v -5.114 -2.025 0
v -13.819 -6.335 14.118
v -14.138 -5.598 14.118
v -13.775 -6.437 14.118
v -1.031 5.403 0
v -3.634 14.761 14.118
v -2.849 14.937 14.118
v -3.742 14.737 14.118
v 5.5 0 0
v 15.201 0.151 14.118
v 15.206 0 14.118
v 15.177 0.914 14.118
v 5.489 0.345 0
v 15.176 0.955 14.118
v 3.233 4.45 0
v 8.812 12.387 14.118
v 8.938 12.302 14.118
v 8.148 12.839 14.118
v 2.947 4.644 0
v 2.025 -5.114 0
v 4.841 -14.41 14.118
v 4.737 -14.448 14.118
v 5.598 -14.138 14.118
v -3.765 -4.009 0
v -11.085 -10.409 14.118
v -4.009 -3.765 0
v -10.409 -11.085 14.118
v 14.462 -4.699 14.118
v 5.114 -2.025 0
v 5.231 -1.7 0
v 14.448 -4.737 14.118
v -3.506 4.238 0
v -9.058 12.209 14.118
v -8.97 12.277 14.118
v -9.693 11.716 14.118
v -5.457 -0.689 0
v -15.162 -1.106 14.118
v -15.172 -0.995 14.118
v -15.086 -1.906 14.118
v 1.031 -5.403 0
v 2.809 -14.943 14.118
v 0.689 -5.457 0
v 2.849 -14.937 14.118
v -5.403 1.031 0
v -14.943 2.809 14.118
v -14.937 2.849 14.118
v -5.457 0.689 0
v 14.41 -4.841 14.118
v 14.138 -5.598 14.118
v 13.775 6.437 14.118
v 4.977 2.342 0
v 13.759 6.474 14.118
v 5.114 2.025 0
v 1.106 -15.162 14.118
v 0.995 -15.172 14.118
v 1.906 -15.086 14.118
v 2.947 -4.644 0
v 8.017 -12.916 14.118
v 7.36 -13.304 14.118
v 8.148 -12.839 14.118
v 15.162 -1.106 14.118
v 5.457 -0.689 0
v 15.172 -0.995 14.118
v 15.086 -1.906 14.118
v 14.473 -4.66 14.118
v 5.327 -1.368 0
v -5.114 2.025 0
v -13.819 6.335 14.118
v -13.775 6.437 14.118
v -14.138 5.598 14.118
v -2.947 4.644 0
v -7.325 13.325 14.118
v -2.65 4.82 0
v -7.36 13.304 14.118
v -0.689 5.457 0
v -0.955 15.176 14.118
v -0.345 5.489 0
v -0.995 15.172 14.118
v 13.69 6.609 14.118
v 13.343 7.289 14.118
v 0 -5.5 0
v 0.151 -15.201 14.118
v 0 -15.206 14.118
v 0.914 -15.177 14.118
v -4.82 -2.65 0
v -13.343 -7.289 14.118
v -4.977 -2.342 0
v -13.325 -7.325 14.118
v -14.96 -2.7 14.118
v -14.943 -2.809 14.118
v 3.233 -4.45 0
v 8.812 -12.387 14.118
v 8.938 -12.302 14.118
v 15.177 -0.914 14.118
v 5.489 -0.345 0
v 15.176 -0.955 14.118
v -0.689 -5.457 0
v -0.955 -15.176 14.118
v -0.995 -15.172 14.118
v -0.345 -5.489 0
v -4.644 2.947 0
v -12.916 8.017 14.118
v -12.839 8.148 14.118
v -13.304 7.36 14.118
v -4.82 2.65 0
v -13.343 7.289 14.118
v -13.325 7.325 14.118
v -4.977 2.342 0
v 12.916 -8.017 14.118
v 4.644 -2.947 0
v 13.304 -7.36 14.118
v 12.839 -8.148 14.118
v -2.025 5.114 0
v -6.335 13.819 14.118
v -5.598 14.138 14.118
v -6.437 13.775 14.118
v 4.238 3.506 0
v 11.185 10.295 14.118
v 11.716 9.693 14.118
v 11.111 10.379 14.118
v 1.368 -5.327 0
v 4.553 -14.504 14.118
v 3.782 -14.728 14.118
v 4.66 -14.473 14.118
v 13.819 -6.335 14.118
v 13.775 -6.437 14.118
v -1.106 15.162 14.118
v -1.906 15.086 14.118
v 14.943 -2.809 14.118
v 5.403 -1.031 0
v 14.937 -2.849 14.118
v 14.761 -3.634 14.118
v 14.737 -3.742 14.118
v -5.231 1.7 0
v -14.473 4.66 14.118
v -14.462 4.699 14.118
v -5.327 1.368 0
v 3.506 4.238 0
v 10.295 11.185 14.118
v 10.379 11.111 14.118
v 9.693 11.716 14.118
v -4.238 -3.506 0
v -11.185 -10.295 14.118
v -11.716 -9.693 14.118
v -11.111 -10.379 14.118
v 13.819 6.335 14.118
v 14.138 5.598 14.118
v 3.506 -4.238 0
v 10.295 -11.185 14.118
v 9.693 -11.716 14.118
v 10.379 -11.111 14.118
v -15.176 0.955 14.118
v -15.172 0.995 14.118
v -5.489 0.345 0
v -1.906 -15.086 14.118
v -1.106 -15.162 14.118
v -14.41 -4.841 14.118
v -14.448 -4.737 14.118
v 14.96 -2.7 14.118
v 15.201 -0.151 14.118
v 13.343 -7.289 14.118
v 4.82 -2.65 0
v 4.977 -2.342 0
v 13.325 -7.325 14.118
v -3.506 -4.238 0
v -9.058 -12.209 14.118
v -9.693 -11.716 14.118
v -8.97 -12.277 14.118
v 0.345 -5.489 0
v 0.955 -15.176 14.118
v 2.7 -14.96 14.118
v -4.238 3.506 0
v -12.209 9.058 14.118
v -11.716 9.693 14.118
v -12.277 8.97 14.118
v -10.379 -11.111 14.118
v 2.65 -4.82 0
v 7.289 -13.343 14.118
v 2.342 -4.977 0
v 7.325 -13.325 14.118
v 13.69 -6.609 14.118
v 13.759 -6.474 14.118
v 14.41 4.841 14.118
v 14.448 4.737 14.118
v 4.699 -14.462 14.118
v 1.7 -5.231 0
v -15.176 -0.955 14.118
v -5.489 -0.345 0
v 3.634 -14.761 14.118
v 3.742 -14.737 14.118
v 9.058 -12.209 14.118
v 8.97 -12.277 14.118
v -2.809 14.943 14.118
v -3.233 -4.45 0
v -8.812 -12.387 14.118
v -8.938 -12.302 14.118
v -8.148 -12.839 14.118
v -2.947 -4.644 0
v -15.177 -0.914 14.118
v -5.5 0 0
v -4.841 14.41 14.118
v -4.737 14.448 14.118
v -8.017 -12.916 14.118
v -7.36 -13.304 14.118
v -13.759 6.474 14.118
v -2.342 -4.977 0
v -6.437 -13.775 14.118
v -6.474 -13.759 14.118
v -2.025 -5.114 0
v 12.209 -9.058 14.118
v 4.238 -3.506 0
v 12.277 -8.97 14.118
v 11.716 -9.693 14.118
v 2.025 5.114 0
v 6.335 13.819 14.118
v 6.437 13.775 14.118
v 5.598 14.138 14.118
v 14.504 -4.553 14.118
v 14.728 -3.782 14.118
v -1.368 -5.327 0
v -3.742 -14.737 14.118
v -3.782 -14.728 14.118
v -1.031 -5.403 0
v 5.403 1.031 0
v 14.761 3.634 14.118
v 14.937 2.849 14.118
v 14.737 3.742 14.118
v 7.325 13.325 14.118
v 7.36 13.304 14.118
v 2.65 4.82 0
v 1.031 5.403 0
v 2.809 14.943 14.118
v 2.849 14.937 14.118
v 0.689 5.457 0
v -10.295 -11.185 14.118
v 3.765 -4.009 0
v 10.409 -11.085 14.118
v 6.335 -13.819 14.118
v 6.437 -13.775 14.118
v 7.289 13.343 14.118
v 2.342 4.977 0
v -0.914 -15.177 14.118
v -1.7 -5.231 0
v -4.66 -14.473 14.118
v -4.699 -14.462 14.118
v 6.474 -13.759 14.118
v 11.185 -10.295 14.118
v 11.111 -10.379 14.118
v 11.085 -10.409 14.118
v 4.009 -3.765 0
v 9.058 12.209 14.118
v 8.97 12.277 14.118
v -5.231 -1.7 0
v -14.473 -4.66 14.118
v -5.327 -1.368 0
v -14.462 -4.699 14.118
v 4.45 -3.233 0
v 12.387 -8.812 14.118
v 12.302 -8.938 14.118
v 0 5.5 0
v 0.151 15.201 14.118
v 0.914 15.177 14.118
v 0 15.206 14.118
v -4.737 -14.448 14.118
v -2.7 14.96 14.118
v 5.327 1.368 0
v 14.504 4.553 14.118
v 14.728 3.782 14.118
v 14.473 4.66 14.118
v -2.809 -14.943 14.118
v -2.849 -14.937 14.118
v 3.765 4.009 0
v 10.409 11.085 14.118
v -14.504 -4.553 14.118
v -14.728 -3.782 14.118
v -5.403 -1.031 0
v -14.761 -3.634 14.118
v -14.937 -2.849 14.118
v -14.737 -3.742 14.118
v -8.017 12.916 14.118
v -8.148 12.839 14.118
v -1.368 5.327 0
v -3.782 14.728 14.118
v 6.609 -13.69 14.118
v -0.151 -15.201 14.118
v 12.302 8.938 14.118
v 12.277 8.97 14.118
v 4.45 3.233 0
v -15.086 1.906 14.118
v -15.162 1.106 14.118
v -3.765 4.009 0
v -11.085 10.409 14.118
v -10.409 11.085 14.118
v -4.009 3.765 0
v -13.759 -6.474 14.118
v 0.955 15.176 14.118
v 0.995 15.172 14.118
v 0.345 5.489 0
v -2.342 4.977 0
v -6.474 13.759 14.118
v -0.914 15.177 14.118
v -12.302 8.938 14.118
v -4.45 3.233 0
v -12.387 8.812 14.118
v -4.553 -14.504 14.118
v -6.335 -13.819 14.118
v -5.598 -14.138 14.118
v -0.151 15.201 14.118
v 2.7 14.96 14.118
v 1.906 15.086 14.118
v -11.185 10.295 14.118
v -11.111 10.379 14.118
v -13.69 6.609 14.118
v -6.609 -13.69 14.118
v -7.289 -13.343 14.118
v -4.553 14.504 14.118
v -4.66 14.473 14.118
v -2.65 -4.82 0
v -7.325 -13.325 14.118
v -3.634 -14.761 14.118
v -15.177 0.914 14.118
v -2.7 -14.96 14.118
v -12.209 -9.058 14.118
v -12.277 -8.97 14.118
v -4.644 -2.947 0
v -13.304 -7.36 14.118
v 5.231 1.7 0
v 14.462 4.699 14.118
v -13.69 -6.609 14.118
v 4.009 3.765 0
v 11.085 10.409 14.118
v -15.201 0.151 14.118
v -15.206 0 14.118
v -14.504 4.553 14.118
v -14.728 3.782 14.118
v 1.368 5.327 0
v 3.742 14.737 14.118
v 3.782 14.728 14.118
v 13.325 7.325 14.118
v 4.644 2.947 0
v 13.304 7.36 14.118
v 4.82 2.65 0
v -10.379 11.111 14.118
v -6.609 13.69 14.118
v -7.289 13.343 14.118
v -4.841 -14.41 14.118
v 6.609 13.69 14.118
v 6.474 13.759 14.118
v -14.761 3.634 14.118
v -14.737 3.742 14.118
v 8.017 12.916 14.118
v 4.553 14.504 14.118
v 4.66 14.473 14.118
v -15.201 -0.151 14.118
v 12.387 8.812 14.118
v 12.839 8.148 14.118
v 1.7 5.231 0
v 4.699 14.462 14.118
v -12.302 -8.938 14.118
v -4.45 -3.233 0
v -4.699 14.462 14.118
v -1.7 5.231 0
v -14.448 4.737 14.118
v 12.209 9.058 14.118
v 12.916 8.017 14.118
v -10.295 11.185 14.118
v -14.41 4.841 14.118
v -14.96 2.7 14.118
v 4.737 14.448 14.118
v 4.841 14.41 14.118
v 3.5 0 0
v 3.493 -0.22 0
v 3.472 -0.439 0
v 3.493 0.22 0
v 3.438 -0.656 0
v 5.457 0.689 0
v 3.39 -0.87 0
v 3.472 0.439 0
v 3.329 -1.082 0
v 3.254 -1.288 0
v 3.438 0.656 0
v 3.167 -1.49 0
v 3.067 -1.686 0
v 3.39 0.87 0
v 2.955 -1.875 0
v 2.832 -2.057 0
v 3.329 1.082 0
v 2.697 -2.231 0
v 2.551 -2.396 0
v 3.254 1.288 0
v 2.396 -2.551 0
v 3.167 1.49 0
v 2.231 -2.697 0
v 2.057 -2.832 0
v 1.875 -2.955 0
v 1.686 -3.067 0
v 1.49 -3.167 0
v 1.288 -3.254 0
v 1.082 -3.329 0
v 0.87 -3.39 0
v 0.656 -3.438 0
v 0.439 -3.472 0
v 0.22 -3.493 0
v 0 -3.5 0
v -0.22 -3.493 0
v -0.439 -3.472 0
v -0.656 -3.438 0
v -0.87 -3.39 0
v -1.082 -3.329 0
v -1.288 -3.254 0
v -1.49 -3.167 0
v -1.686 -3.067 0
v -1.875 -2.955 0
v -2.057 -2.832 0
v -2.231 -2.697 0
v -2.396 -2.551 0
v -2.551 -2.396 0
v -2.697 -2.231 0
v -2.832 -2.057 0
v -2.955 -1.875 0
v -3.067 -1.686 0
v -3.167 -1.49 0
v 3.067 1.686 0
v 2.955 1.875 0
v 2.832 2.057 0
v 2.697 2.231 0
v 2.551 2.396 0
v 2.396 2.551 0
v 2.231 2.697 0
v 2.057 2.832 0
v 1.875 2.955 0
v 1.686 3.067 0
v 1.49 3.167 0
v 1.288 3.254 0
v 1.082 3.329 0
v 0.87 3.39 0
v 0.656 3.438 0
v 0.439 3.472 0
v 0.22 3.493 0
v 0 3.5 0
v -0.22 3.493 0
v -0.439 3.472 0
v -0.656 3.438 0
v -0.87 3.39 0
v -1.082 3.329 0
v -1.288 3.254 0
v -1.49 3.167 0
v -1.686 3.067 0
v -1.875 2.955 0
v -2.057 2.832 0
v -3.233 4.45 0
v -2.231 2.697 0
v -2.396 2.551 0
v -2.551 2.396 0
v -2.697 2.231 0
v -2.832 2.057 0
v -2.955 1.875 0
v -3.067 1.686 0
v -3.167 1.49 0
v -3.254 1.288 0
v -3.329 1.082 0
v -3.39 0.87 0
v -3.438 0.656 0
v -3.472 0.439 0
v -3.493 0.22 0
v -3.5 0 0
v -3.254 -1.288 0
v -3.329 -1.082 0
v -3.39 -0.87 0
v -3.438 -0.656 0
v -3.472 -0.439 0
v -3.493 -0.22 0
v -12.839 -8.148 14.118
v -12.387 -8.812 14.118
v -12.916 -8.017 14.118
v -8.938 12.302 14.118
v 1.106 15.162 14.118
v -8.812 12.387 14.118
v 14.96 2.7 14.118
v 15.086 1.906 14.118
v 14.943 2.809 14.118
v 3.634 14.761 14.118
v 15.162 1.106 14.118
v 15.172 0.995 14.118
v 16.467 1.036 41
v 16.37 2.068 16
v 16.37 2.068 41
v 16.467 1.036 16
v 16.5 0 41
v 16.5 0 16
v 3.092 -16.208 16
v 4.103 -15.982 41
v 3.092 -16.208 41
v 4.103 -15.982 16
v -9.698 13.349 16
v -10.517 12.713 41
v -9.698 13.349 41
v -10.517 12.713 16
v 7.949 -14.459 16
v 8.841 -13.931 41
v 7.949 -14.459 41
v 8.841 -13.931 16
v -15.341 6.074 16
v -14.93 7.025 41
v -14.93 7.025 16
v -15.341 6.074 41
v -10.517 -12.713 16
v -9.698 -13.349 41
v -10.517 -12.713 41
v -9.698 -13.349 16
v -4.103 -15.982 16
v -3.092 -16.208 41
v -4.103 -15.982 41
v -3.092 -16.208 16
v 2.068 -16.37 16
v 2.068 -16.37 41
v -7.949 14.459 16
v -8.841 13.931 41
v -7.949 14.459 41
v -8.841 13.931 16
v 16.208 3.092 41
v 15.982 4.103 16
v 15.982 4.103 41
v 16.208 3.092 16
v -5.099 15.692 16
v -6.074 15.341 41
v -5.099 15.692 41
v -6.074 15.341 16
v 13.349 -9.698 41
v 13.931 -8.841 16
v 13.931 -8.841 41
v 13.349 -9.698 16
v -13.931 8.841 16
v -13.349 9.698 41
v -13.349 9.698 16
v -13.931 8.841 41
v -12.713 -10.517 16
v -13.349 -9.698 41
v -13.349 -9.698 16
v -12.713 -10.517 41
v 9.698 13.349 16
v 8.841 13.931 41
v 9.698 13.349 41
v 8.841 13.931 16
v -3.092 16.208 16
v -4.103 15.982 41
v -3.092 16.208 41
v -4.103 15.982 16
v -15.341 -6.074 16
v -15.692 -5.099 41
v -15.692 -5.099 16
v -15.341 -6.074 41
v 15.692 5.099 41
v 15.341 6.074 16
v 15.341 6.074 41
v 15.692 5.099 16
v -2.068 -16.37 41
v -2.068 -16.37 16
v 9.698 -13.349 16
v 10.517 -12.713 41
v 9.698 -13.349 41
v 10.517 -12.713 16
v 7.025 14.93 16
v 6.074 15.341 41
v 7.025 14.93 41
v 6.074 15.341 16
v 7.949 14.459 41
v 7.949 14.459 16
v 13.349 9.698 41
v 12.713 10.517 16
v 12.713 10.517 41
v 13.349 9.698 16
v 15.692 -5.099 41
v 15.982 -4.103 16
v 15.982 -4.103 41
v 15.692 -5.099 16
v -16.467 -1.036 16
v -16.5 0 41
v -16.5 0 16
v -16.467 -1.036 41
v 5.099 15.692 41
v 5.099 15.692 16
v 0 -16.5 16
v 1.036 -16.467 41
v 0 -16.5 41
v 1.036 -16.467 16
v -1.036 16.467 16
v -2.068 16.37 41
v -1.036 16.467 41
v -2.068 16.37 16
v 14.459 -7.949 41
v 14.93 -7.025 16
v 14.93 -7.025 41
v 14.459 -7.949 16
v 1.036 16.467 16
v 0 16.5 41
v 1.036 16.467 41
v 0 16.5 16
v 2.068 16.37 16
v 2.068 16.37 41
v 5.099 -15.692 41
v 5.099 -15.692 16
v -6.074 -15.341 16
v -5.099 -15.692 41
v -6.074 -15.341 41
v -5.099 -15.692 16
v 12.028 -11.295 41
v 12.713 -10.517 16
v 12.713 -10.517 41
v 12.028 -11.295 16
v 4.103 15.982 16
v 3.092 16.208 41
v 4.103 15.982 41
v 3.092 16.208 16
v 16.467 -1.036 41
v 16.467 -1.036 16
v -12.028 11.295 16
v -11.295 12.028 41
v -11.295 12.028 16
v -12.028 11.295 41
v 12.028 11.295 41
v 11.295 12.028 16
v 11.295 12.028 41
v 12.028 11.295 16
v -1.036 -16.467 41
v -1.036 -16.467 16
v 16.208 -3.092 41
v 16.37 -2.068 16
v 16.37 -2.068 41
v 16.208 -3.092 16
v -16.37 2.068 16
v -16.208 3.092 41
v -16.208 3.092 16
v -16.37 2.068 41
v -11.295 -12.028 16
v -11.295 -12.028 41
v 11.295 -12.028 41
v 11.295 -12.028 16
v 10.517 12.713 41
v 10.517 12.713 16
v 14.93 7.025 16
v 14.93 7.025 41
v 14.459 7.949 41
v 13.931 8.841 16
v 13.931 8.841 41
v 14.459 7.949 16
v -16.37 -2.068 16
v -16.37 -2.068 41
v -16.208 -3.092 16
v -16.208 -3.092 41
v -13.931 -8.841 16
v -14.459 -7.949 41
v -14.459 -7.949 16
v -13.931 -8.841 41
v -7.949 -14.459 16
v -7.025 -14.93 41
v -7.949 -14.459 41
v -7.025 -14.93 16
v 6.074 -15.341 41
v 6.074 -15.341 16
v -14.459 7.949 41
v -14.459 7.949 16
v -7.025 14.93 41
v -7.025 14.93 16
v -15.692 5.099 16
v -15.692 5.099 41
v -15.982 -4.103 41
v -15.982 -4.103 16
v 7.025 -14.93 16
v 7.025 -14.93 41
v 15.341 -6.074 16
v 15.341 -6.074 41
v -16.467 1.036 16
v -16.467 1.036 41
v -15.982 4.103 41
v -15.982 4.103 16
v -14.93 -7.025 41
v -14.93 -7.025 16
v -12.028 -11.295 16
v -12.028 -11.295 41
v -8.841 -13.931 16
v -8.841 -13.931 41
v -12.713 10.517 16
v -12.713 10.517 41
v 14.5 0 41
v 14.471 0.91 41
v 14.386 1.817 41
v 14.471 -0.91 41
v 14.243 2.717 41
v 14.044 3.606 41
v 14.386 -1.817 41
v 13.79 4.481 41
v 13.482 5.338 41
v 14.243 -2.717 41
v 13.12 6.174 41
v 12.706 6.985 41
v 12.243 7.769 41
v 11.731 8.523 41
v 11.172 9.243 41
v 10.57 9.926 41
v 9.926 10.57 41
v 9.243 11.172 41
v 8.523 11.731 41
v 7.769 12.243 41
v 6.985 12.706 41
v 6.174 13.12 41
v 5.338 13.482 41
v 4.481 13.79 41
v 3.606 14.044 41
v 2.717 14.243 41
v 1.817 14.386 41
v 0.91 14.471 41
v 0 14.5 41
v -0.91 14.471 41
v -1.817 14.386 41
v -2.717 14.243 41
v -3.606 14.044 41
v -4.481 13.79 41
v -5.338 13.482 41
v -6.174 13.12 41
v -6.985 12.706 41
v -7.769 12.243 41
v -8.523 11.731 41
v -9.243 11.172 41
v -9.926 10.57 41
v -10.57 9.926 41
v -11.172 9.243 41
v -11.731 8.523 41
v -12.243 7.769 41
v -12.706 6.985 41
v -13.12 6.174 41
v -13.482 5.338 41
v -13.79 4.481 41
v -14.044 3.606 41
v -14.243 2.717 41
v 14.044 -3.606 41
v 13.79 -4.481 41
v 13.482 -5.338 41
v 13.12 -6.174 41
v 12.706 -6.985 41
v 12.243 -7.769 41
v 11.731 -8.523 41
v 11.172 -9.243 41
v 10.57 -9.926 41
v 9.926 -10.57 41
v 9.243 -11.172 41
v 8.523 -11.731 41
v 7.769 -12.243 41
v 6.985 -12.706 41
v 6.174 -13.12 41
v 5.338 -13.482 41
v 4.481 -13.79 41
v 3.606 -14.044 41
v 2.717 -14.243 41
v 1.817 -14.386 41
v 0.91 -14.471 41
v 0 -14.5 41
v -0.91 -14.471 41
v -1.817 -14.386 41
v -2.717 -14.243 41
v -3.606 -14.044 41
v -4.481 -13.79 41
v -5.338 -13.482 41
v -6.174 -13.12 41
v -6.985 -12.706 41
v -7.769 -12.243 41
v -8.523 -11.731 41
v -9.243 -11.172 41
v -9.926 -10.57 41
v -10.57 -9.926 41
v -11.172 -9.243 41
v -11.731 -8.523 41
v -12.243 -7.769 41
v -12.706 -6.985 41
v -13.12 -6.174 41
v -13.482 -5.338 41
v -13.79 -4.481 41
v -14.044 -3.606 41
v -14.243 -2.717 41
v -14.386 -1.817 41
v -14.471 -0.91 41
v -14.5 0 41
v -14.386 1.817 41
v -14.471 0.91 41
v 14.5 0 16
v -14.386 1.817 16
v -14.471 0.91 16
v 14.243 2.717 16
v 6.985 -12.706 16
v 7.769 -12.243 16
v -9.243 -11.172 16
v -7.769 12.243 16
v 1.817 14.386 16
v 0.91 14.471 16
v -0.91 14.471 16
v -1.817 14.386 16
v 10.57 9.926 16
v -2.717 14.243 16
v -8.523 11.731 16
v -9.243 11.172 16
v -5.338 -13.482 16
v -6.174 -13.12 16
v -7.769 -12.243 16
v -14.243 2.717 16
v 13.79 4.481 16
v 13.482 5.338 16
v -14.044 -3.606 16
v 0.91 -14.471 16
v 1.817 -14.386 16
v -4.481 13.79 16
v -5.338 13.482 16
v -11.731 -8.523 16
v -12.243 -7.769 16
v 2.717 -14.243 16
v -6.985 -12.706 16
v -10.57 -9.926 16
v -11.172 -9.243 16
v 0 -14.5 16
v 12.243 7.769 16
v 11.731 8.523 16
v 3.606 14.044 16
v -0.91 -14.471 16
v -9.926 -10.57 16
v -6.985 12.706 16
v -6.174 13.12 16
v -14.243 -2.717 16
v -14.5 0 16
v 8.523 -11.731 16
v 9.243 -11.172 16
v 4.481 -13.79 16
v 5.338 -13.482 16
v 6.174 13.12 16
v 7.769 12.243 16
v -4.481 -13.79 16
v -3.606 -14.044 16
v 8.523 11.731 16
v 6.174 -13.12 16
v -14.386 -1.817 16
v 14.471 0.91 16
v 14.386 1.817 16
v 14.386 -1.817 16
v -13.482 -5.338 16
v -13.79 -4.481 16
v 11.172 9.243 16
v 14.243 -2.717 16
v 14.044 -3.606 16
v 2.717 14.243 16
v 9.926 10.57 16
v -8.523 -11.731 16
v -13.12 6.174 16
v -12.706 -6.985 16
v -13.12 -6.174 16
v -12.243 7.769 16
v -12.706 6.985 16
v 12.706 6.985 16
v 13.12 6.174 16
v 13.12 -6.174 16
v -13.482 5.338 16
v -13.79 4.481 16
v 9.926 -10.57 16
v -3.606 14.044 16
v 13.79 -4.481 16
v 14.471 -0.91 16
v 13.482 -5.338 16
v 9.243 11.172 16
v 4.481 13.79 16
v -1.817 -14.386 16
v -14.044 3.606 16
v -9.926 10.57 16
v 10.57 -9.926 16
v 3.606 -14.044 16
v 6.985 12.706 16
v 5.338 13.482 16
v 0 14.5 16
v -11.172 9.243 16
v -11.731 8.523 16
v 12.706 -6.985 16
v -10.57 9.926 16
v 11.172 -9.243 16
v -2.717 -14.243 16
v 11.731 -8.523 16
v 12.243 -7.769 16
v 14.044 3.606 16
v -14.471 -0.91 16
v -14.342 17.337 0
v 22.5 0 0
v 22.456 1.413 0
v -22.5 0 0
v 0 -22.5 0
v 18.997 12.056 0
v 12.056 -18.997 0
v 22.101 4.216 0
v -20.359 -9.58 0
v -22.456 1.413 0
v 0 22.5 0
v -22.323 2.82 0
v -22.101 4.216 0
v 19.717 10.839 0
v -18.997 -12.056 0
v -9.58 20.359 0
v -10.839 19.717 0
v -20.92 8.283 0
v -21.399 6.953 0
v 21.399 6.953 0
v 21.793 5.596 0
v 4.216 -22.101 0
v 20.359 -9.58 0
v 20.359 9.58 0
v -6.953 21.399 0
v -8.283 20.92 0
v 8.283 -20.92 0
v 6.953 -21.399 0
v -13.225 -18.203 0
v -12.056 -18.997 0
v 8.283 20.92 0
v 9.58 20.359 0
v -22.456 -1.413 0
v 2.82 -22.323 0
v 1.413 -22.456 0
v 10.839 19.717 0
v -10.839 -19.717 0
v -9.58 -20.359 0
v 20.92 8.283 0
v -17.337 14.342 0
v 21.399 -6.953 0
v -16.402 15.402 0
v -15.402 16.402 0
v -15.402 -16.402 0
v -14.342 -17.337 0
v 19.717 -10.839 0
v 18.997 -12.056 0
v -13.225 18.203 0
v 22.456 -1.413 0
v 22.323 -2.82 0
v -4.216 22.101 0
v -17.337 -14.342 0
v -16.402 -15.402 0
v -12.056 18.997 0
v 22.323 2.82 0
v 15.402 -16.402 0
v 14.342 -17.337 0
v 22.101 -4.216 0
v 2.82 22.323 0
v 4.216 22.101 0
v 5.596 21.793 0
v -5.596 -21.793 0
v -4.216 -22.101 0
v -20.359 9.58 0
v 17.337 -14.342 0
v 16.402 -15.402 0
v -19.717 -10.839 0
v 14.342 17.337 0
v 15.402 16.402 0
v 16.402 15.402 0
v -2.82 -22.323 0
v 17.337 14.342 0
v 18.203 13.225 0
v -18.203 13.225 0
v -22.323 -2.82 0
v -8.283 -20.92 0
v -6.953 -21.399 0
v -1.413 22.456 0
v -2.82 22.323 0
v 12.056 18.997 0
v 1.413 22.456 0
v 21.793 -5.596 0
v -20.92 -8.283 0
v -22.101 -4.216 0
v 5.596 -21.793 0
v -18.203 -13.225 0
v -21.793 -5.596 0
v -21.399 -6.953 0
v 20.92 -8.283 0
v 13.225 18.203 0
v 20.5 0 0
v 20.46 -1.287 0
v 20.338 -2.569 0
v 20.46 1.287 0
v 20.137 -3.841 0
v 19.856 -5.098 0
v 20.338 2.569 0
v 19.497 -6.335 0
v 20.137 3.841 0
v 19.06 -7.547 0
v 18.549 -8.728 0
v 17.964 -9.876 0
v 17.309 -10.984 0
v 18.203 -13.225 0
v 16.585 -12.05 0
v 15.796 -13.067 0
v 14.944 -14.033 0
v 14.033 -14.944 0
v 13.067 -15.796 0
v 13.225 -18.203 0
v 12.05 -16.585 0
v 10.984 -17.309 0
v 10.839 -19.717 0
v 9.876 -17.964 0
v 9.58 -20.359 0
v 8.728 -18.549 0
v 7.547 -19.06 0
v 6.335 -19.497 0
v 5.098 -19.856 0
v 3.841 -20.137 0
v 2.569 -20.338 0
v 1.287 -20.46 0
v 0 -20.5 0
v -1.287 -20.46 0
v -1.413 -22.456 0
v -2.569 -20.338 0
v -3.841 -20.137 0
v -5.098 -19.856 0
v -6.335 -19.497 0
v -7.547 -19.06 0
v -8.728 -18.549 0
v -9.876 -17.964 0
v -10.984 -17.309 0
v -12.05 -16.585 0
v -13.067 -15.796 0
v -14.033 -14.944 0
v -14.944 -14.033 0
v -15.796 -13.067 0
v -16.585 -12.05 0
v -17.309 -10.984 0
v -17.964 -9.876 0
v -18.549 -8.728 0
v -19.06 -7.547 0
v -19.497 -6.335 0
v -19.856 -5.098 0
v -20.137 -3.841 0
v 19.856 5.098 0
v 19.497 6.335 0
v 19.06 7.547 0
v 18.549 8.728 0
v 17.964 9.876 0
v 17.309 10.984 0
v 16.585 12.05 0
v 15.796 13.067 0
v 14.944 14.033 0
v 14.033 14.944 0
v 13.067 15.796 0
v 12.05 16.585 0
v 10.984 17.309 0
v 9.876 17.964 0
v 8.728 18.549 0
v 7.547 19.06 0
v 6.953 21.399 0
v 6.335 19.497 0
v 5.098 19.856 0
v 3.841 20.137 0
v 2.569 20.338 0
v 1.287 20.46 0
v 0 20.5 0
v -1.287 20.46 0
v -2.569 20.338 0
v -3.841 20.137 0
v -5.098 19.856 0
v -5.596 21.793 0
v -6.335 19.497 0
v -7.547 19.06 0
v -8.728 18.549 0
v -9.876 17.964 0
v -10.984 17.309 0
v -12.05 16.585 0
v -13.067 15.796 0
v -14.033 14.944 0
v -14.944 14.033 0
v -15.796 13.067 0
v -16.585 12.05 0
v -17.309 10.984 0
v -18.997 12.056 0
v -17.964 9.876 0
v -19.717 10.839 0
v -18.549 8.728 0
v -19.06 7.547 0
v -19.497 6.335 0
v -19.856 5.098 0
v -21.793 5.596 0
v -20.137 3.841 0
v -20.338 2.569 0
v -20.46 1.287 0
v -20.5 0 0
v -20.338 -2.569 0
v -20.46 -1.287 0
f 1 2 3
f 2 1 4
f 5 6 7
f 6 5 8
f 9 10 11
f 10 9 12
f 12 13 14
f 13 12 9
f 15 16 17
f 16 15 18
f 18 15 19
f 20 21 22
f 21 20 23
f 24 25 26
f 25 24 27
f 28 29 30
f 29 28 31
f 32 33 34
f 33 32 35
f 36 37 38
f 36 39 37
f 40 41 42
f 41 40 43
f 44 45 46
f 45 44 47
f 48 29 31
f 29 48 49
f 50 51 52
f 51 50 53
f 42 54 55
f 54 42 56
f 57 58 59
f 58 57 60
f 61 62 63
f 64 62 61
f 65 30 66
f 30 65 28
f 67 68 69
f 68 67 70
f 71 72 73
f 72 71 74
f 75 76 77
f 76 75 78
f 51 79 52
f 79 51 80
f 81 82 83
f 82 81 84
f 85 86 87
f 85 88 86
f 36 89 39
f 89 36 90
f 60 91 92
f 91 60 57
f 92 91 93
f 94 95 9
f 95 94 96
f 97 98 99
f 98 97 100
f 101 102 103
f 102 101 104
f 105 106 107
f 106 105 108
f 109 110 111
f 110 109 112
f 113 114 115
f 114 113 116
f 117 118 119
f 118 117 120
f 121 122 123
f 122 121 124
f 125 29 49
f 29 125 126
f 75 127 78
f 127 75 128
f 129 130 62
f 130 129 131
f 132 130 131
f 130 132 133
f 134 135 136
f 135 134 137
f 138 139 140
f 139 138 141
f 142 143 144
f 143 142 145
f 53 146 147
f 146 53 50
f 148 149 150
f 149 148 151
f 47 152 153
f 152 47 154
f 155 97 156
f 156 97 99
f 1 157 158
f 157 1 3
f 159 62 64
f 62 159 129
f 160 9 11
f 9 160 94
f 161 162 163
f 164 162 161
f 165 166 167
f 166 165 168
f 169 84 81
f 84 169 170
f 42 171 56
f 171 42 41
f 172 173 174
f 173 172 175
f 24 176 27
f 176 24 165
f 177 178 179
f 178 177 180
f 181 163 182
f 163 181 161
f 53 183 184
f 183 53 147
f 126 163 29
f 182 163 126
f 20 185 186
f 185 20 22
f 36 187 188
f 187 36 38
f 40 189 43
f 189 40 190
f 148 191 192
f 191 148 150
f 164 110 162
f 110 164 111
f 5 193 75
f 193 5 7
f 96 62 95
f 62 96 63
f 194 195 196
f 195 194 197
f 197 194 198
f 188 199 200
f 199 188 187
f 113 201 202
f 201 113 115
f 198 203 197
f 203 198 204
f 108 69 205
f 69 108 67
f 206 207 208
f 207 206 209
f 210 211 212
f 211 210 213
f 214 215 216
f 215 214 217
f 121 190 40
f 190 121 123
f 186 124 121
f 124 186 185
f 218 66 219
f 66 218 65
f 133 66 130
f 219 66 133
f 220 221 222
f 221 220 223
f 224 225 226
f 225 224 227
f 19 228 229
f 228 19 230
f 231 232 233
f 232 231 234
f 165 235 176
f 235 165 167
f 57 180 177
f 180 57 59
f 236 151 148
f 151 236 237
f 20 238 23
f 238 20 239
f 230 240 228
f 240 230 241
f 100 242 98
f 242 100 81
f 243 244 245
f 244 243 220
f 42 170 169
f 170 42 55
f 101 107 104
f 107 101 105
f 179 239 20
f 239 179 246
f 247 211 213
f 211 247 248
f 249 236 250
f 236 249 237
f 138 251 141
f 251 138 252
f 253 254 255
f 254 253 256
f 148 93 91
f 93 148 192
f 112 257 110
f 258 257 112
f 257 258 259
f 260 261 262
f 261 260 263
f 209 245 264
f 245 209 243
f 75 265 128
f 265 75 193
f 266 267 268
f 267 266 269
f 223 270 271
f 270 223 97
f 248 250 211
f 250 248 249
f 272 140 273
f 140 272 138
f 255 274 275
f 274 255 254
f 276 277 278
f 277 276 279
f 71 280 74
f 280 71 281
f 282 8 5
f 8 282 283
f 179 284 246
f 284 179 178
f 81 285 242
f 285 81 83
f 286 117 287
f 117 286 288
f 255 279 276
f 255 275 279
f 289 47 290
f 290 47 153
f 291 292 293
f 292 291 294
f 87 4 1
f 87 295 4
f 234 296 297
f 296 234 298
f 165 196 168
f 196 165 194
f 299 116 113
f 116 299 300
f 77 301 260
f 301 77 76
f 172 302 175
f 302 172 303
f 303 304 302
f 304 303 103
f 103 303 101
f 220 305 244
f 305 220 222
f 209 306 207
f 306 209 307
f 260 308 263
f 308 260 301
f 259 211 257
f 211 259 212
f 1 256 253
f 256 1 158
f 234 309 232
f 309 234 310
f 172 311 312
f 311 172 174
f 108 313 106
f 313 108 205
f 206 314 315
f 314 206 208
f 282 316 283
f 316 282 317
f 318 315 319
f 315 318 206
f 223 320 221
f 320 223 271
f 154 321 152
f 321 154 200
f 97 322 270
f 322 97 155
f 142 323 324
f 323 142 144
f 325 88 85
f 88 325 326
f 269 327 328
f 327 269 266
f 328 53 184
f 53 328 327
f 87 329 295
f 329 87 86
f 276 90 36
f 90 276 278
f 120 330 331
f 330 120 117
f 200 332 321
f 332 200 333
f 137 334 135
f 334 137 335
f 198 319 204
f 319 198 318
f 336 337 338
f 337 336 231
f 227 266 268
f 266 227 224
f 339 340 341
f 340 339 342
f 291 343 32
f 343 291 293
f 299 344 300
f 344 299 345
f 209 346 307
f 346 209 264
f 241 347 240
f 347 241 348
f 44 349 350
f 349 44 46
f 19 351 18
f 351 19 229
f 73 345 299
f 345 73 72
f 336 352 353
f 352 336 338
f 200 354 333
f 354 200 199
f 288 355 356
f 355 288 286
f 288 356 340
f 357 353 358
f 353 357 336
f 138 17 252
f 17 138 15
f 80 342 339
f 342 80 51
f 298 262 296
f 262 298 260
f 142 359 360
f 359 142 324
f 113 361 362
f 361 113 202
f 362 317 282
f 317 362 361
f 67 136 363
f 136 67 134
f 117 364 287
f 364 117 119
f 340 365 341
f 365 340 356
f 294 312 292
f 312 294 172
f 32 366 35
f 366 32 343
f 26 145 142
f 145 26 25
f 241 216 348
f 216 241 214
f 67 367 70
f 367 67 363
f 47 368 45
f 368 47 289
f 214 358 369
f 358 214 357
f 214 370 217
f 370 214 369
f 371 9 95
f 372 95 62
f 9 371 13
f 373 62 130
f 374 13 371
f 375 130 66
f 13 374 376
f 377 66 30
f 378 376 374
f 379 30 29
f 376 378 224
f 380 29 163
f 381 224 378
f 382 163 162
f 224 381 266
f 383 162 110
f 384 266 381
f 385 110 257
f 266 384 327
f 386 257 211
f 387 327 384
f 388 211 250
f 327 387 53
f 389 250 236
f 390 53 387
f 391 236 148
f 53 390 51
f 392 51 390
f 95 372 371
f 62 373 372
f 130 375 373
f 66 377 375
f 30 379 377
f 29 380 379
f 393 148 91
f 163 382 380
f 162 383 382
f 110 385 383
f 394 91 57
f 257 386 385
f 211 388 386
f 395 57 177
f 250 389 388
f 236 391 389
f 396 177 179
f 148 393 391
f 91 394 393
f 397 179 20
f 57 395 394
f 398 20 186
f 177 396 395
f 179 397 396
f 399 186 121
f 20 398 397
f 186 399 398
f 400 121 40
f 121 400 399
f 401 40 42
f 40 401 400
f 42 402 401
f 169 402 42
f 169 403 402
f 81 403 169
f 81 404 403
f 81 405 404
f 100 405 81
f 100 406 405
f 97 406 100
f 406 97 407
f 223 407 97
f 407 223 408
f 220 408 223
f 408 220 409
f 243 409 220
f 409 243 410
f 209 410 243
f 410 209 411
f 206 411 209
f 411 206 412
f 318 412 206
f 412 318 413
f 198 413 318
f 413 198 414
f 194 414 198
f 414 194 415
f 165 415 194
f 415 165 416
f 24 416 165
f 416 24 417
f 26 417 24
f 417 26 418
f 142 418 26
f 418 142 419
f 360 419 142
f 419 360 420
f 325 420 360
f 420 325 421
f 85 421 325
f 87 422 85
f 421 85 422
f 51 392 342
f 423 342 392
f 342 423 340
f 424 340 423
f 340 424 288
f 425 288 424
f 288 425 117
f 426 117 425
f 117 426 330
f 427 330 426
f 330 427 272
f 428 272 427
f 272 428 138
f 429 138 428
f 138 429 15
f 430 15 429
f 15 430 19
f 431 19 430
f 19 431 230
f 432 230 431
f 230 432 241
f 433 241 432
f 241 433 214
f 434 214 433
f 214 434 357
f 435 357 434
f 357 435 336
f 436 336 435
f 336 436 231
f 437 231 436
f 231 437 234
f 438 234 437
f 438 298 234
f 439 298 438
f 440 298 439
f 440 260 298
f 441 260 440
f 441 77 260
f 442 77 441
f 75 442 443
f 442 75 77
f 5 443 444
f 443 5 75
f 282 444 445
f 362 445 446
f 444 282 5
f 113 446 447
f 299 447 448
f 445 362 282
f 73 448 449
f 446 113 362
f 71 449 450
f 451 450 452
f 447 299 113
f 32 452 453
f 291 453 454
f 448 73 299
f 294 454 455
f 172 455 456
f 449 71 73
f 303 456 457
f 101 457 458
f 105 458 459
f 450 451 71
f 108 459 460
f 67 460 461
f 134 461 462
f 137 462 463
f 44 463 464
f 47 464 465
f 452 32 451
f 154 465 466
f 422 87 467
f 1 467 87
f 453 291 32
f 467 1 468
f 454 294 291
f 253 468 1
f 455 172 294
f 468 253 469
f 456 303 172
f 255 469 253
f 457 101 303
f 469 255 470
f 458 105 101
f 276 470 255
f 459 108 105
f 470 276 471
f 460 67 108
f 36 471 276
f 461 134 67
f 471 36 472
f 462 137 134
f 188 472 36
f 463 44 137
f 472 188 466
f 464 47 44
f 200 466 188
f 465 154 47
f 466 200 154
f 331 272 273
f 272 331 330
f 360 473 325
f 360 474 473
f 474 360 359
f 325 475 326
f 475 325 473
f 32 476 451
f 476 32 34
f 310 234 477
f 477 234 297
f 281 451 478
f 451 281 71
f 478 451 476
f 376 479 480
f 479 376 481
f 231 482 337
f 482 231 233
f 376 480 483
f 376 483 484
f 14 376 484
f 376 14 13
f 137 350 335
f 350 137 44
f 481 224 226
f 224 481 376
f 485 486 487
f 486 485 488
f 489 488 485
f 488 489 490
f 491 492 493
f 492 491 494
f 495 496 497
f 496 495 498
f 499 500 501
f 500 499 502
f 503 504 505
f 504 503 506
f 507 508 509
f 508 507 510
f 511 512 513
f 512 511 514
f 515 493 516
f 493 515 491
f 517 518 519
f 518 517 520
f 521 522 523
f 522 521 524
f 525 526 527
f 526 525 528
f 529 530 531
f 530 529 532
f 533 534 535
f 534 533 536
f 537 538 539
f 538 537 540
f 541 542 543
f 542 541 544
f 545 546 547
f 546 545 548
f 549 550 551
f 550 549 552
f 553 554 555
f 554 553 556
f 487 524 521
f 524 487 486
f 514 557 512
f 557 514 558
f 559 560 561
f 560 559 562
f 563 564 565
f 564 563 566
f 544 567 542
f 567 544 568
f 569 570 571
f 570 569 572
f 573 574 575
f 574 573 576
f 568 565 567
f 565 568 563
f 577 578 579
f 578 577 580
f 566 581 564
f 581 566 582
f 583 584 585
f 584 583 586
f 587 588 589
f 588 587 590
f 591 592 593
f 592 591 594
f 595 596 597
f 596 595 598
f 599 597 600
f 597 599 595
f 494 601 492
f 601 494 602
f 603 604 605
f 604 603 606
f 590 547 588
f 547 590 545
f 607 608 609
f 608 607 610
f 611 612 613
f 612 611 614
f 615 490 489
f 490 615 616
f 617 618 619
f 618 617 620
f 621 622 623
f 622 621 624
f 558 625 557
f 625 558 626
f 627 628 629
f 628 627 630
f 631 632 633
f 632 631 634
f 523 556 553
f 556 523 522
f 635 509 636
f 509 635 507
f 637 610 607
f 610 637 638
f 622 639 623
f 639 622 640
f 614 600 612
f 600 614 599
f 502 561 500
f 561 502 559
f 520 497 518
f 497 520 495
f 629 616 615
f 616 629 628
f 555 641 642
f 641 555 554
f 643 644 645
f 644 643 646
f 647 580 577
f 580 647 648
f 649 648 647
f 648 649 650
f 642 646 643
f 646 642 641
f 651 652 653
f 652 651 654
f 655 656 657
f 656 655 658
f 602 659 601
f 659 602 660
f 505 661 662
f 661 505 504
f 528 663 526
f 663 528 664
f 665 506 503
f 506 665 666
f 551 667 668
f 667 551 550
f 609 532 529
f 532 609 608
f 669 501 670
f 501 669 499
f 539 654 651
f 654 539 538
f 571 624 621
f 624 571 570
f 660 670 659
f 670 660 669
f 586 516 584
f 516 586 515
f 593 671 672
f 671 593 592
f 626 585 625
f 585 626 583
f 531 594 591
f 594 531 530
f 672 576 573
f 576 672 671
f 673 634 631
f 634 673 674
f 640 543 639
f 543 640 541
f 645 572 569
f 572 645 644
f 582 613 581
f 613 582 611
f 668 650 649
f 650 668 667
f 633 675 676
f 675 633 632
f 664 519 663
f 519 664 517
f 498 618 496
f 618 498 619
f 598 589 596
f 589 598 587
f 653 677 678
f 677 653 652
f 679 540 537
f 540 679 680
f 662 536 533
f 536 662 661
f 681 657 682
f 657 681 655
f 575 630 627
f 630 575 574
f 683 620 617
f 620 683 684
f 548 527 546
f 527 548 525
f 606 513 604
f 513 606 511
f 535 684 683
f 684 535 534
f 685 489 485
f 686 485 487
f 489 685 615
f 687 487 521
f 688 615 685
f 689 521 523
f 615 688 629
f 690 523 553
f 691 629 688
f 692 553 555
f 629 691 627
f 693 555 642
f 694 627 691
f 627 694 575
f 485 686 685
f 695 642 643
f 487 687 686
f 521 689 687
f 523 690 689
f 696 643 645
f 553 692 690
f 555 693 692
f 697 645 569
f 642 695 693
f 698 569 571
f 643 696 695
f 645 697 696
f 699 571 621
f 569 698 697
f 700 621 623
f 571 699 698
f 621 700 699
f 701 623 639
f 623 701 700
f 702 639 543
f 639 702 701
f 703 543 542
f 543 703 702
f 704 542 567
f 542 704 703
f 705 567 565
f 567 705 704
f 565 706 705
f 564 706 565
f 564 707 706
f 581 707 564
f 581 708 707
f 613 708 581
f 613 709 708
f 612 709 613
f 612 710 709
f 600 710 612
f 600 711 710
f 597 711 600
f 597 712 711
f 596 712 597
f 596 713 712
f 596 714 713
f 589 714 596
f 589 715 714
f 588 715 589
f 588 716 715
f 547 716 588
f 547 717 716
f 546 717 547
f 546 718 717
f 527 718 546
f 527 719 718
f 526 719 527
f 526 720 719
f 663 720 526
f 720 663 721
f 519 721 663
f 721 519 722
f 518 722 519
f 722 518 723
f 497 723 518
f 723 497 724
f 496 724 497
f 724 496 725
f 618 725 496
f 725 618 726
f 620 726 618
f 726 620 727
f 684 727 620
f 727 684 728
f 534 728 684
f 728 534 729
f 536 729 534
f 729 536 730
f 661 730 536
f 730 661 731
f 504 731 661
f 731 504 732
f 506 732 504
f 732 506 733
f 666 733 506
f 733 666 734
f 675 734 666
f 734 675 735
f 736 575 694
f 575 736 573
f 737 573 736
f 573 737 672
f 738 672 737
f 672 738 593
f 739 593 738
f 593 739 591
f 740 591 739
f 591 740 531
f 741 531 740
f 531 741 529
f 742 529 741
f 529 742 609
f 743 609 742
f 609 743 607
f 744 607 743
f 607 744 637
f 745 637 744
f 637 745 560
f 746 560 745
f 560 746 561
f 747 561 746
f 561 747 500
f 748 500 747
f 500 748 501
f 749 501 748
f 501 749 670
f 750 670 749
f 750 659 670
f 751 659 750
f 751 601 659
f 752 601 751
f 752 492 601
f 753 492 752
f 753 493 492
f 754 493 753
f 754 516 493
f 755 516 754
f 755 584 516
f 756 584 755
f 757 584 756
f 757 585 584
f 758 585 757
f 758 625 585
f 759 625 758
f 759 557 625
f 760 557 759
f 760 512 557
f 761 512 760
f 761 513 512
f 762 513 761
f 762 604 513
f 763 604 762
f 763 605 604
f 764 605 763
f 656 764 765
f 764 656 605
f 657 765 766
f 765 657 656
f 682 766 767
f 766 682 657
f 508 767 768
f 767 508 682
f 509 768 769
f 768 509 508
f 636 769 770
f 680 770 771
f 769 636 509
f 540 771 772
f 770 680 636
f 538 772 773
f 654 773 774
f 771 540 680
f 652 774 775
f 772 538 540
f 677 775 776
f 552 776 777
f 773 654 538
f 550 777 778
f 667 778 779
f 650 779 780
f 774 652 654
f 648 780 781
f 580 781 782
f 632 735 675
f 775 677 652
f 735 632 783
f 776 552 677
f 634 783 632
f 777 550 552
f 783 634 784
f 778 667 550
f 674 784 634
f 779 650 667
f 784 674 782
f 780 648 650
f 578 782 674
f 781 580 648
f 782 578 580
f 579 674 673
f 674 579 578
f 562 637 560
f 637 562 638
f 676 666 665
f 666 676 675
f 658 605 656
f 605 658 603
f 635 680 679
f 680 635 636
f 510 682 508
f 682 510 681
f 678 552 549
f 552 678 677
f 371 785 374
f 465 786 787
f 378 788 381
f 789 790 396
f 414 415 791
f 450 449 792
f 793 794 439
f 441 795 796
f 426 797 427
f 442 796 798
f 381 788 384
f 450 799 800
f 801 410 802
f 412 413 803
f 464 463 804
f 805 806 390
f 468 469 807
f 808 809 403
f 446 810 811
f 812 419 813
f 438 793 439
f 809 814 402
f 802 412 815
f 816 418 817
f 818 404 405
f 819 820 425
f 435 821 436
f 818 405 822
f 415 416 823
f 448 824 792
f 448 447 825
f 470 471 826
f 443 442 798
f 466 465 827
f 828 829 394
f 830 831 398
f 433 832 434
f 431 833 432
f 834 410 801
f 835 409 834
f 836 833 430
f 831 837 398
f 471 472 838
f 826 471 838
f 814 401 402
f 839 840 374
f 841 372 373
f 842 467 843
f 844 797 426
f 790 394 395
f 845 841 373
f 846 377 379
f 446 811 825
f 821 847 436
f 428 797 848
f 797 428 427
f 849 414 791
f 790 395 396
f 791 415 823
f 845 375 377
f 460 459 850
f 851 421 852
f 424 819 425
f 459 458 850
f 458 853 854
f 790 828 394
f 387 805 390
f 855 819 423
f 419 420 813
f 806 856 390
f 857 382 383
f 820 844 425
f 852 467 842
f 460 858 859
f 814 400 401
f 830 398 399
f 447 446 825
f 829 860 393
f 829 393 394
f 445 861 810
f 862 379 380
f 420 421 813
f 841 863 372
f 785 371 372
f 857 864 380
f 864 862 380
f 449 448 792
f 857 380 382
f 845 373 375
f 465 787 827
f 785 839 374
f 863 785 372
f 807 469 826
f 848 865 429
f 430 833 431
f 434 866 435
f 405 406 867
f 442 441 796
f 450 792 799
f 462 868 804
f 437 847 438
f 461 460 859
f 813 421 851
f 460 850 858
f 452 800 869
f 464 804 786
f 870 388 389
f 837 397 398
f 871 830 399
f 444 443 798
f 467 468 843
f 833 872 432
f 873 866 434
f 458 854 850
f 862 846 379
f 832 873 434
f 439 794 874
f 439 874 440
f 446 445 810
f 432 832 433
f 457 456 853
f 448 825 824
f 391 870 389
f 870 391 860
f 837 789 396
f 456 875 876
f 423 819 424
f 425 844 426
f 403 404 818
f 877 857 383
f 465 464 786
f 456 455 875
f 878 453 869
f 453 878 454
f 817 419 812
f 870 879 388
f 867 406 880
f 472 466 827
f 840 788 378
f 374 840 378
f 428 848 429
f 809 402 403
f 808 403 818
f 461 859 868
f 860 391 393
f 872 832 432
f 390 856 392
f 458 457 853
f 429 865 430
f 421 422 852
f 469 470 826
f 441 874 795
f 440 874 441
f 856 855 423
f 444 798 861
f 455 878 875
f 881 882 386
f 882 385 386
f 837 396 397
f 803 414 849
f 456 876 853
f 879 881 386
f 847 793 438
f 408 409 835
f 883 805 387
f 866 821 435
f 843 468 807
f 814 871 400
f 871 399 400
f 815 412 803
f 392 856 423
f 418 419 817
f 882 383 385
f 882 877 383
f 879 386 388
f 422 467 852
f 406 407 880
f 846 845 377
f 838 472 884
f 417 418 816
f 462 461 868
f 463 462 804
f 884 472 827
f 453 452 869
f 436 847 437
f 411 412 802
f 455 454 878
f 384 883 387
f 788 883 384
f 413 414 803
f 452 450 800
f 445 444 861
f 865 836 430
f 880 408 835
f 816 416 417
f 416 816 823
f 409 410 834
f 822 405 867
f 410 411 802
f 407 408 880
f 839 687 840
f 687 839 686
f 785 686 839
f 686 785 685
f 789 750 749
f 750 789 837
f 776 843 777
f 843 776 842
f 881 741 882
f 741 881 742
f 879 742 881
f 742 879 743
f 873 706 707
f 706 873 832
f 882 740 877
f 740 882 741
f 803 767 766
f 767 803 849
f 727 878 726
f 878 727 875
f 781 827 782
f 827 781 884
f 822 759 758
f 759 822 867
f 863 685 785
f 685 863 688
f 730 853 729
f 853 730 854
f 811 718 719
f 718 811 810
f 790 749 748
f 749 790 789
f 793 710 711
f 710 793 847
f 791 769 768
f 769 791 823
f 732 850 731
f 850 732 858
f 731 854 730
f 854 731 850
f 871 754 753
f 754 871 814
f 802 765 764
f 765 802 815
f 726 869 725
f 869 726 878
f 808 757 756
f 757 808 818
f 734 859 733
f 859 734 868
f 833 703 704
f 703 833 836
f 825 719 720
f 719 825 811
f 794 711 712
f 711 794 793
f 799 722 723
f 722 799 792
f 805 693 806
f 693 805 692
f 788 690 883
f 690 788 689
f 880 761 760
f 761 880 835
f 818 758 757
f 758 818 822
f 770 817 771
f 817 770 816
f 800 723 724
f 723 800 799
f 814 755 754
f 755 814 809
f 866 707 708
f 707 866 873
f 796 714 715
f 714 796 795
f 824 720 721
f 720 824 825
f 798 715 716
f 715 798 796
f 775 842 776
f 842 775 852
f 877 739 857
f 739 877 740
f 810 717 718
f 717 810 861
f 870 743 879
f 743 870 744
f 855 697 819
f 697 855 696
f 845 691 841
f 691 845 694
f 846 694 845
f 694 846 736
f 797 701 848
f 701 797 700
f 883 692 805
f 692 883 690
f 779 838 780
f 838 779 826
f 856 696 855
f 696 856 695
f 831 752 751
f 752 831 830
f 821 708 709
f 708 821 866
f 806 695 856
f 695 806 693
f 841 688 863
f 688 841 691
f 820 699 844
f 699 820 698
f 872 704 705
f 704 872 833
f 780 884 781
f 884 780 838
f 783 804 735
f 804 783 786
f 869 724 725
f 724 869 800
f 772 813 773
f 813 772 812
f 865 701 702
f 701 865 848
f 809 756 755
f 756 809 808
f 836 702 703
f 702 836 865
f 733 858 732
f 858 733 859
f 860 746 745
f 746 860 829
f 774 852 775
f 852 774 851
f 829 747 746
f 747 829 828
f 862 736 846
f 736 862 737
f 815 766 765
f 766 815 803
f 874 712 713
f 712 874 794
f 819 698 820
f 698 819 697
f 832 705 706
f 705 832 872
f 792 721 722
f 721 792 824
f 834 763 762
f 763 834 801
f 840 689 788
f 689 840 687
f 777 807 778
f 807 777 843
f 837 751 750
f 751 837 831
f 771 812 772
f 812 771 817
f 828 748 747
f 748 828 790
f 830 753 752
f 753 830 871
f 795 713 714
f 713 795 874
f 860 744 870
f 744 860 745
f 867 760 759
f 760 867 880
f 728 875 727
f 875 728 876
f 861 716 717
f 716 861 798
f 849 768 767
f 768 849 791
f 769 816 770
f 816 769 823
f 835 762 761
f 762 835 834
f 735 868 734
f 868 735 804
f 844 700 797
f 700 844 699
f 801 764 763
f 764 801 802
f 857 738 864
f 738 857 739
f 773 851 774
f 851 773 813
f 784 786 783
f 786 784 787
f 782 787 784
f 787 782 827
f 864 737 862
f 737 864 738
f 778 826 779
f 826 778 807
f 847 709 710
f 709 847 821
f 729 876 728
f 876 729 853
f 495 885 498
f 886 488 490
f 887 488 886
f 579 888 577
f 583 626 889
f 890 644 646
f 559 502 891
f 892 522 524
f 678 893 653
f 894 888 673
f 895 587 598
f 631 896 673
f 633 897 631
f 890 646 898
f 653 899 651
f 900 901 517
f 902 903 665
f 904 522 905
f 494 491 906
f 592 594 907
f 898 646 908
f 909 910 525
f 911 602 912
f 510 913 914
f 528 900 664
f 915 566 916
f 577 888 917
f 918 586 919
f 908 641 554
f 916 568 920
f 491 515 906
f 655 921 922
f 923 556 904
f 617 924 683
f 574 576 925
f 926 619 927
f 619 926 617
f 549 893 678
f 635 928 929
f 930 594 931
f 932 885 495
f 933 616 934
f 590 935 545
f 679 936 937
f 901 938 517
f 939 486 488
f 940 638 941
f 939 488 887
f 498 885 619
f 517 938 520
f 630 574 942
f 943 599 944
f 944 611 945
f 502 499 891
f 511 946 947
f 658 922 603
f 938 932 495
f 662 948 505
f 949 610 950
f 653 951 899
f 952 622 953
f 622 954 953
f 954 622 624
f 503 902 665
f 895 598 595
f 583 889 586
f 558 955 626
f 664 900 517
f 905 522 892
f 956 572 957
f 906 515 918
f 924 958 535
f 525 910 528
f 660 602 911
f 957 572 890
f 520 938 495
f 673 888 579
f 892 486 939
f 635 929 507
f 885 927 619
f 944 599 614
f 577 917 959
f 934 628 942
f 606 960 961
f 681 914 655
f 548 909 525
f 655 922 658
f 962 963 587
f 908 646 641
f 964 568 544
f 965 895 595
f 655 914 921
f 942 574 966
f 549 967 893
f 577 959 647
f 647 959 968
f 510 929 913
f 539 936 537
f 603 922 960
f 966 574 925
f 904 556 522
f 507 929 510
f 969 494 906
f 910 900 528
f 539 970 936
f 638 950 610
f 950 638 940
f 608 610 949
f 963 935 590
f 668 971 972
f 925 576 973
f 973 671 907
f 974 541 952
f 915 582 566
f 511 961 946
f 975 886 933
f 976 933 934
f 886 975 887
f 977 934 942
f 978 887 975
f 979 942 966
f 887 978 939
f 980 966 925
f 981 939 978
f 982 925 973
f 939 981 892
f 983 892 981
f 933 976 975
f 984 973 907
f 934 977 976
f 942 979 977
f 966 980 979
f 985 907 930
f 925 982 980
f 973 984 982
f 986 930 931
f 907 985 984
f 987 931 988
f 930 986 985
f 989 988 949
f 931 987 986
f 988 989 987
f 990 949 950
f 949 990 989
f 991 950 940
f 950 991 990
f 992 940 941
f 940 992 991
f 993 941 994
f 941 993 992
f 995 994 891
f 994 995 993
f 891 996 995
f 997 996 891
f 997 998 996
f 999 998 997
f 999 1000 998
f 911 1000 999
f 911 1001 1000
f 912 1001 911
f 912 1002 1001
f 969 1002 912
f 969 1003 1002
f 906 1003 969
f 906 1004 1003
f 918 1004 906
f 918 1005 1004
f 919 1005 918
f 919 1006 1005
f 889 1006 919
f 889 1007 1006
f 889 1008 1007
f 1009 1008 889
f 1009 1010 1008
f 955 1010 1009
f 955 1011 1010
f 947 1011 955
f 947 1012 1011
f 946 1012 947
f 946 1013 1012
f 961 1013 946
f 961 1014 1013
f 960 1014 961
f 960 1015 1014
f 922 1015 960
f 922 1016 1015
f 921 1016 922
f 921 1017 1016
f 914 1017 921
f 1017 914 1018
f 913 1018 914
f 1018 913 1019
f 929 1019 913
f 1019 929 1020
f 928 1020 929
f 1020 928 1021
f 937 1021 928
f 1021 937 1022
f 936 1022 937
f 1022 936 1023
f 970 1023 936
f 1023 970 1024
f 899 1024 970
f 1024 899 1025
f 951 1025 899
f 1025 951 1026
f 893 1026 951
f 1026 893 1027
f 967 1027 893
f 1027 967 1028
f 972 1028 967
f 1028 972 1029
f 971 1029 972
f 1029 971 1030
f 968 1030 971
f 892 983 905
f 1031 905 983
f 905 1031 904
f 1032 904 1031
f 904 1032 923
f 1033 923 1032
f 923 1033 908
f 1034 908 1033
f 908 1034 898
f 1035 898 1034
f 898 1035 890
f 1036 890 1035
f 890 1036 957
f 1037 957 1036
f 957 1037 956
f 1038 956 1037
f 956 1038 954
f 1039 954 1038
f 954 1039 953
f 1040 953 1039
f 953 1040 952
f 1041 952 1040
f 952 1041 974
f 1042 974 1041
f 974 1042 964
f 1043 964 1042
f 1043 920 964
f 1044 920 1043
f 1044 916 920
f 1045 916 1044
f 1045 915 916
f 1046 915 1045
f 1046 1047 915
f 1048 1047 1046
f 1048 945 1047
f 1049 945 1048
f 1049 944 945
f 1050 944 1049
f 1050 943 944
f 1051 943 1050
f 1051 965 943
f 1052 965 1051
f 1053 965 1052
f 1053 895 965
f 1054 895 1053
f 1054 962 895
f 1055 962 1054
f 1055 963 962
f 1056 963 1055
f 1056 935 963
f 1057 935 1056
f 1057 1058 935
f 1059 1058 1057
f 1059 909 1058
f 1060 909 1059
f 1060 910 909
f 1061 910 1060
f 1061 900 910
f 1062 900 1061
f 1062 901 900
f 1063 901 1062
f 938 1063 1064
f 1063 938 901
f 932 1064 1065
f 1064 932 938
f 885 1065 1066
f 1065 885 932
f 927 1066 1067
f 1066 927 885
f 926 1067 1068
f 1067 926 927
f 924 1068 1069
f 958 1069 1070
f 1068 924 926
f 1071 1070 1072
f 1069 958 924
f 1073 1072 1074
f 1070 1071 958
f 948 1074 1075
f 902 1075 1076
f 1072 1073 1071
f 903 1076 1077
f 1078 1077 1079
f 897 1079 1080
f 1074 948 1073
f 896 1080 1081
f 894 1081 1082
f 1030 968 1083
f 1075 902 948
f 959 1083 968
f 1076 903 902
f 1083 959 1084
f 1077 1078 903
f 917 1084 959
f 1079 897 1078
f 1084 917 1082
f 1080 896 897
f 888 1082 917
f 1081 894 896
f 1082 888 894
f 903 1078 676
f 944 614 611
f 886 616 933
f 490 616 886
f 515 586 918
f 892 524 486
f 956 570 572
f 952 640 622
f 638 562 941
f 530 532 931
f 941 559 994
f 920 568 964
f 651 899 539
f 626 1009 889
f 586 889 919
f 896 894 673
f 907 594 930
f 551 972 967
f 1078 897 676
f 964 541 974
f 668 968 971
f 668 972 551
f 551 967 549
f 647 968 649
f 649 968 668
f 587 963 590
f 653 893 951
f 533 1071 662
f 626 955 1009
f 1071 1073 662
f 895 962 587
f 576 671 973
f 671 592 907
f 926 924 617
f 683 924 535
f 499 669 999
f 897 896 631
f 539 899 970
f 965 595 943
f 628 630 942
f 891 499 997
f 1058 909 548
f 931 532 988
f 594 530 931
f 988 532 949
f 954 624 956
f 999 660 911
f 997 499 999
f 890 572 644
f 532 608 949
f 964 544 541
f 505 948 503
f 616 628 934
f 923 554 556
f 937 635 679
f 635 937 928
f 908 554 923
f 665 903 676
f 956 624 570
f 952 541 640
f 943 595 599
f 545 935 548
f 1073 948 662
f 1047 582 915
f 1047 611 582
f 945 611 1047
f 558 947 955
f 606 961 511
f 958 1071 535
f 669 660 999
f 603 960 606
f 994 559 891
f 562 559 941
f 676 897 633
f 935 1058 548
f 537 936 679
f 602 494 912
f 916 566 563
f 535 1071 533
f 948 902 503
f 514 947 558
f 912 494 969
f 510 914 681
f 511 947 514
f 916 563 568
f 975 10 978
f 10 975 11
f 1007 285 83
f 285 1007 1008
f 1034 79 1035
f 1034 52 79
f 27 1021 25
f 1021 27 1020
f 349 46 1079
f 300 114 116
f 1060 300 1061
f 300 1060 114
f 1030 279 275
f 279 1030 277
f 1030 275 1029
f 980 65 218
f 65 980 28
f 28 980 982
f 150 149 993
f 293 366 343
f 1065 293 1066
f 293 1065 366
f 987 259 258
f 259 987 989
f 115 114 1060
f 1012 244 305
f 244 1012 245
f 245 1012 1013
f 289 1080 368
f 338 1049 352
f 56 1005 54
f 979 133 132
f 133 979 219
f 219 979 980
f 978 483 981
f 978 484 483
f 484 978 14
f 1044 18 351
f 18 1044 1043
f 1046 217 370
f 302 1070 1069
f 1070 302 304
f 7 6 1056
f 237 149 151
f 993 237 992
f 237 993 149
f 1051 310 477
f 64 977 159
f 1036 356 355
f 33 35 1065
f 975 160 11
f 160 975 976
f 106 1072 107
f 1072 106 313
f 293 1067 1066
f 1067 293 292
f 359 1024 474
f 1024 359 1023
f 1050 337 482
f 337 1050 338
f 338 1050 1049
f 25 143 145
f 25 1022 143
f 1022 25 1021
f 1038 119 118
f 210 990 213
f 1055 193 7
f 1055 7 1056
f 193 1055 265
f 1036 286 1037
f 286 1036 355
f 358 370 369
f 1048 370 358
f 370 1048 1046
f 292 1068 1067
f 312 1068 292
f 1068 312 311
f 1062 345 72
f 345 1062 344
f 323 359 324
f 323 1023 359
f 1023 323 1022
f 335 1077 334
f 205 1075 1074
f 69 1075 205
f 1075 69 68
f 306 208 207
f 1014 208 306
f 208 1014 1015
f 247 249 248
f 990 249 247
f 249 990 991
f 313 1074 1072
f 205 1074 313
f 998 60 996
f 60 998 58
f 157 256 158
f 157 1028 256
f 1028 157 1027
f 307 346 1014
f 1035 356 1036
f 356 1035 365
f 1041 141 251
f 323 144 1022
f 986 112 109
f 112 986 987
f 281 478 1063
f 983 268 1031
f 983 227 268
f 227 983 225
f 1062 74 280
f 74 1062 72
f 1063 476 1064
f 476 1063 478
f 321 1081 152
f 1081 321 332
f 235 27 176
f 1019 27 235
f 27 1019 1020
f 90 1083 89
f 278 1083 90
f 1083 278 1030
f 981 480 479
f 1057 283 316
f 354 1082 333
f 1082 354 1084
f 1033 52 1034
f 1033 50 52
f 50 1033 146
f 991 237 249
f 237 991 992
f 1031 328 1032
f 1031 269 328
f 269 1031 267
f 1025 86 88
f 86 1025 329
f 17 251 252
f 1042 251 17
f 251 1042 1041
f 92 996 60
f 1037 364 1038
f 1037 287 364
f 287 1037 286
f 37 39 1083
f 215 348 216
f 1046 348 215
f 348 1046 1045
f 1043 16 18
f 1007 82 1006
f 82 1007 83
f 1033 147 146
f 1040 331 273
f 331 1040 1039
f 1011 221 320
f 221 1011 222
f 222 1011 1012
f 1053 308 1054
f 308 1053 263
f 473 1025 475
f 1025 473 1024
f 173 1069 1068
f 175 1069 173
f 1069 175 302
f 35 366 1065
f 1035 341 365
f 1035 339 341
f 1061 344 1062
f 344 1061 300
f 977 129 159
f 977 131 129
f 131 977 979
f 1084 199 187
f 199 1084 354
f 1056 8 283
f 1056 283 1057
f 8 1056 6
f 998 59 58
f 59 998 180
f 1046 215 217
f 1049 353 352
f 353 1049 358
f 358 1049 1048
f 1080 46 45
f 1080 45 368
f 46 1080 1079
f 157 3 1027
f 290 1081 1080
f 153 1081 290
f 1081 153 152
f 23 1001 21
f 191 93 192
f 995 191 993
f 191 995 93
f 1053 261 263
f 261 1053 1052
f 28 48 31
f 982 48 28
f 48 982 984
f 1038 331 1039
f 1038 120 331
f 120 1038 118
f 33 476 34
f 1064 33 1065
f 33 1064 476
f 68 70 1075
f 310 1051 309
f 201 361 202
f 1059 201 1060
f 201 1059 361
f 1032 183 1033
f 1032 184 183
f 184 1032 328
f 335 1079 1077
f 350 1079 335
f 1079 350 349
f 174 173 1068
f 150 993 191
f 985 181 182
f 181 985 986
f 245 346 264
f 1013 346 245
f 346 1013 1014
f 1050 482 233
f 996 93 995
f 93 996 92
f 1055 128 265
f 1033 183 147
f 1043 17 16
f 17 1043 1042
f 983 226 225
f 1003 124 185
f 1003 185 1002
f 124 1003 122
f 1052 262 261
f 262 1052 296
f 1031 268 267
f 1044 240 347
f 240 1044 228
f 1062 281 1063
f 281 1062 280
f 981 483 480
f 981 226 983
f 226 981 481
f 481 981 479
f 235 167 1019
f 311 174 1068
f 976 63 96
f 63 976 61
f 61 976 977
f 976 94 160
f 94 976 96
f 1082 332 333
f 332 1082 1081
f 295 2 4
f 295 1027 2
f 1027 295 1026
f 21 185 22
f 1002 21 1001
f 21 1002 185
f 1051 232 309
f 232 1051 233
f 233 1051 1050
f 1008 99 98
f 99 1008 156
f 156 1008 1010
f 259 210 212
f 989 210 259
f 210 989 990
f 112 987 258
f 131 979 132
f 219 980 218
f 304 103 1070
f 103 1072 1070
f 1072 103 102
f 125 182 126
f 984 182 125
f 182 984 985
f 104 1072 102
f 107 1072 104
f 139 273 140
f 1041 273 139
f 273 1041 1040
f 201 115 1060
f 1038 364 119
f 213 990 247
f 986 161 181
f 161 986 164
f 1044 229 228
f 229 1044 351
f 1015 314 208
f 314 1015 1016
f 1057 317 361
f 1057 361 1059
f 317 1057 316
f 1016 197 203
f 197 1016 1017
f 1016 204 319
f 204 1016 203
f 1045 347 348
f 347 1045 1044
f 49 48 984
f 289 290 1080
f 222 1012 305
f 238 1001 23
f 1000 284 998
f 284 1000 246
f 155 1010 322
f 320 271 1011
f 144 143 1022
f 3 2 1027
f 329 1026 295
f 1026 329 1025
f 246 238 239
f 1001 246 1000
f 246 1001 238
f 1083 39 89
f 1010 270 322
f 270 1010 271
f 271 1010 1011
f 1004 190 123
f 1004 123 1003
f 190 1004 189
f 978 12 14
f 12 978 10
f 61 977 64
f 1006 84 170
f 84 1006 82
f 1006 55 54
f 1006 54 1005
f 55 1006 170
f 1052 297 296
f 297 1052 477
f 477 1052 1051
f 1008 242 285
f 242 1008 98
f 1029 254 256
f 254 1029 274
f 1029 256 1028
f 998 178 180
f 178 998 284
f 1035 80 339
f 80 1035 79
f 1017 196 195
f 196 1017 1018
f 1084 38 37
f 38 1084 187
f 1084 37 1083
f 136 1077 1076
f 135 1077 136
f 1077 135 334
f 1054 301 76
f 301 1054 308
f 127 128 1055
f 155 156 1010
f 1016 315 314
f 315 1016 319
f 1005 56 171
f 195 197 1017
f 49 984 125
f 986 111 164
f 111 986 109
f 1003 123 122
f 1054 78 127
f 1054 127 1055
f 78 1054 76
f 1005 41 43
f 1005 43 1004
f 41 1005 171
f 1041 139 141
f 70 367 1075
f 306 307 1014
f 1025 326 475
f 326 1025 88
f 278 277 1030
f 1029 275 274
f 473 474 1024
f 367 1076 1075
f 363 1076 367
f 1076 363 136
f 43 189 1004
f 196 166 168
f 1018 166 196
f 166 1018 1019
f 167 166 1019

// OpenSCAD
//The part wall thickness
wall = 2;
//outer diameter of conical
tube_diameter = 29;
//diameter of bottom tip of conical
bottom_diameter = 7; 
//height of the tapered part of conical
taper_height = 16; 
//total height of holder
overall_height = 25; 
//desired diameter of base.  
base_diameter = 45;  


/*[Hidden]*/
$fn = 100;

difference() {
conical(bottom_diameter+2*wall,taper_height,tube_diameter+2*wall,overall_height);
conical(bottom_diameter,taper_height,tube_diameter,overall_height);
}
difference() {
conical(base_diameter,taper_height,tube_diameter+2*wall,overall_height);
conical(base_diameter-2*wall,taper_height,tube_diameter,overall_height);
}
module conical(bd,th,td,oah) {
  cylinder(h=th,d1=bd,d2=td,center=false);
  translate([0,0,th]) cylinder(h=oah,d=td);
}
